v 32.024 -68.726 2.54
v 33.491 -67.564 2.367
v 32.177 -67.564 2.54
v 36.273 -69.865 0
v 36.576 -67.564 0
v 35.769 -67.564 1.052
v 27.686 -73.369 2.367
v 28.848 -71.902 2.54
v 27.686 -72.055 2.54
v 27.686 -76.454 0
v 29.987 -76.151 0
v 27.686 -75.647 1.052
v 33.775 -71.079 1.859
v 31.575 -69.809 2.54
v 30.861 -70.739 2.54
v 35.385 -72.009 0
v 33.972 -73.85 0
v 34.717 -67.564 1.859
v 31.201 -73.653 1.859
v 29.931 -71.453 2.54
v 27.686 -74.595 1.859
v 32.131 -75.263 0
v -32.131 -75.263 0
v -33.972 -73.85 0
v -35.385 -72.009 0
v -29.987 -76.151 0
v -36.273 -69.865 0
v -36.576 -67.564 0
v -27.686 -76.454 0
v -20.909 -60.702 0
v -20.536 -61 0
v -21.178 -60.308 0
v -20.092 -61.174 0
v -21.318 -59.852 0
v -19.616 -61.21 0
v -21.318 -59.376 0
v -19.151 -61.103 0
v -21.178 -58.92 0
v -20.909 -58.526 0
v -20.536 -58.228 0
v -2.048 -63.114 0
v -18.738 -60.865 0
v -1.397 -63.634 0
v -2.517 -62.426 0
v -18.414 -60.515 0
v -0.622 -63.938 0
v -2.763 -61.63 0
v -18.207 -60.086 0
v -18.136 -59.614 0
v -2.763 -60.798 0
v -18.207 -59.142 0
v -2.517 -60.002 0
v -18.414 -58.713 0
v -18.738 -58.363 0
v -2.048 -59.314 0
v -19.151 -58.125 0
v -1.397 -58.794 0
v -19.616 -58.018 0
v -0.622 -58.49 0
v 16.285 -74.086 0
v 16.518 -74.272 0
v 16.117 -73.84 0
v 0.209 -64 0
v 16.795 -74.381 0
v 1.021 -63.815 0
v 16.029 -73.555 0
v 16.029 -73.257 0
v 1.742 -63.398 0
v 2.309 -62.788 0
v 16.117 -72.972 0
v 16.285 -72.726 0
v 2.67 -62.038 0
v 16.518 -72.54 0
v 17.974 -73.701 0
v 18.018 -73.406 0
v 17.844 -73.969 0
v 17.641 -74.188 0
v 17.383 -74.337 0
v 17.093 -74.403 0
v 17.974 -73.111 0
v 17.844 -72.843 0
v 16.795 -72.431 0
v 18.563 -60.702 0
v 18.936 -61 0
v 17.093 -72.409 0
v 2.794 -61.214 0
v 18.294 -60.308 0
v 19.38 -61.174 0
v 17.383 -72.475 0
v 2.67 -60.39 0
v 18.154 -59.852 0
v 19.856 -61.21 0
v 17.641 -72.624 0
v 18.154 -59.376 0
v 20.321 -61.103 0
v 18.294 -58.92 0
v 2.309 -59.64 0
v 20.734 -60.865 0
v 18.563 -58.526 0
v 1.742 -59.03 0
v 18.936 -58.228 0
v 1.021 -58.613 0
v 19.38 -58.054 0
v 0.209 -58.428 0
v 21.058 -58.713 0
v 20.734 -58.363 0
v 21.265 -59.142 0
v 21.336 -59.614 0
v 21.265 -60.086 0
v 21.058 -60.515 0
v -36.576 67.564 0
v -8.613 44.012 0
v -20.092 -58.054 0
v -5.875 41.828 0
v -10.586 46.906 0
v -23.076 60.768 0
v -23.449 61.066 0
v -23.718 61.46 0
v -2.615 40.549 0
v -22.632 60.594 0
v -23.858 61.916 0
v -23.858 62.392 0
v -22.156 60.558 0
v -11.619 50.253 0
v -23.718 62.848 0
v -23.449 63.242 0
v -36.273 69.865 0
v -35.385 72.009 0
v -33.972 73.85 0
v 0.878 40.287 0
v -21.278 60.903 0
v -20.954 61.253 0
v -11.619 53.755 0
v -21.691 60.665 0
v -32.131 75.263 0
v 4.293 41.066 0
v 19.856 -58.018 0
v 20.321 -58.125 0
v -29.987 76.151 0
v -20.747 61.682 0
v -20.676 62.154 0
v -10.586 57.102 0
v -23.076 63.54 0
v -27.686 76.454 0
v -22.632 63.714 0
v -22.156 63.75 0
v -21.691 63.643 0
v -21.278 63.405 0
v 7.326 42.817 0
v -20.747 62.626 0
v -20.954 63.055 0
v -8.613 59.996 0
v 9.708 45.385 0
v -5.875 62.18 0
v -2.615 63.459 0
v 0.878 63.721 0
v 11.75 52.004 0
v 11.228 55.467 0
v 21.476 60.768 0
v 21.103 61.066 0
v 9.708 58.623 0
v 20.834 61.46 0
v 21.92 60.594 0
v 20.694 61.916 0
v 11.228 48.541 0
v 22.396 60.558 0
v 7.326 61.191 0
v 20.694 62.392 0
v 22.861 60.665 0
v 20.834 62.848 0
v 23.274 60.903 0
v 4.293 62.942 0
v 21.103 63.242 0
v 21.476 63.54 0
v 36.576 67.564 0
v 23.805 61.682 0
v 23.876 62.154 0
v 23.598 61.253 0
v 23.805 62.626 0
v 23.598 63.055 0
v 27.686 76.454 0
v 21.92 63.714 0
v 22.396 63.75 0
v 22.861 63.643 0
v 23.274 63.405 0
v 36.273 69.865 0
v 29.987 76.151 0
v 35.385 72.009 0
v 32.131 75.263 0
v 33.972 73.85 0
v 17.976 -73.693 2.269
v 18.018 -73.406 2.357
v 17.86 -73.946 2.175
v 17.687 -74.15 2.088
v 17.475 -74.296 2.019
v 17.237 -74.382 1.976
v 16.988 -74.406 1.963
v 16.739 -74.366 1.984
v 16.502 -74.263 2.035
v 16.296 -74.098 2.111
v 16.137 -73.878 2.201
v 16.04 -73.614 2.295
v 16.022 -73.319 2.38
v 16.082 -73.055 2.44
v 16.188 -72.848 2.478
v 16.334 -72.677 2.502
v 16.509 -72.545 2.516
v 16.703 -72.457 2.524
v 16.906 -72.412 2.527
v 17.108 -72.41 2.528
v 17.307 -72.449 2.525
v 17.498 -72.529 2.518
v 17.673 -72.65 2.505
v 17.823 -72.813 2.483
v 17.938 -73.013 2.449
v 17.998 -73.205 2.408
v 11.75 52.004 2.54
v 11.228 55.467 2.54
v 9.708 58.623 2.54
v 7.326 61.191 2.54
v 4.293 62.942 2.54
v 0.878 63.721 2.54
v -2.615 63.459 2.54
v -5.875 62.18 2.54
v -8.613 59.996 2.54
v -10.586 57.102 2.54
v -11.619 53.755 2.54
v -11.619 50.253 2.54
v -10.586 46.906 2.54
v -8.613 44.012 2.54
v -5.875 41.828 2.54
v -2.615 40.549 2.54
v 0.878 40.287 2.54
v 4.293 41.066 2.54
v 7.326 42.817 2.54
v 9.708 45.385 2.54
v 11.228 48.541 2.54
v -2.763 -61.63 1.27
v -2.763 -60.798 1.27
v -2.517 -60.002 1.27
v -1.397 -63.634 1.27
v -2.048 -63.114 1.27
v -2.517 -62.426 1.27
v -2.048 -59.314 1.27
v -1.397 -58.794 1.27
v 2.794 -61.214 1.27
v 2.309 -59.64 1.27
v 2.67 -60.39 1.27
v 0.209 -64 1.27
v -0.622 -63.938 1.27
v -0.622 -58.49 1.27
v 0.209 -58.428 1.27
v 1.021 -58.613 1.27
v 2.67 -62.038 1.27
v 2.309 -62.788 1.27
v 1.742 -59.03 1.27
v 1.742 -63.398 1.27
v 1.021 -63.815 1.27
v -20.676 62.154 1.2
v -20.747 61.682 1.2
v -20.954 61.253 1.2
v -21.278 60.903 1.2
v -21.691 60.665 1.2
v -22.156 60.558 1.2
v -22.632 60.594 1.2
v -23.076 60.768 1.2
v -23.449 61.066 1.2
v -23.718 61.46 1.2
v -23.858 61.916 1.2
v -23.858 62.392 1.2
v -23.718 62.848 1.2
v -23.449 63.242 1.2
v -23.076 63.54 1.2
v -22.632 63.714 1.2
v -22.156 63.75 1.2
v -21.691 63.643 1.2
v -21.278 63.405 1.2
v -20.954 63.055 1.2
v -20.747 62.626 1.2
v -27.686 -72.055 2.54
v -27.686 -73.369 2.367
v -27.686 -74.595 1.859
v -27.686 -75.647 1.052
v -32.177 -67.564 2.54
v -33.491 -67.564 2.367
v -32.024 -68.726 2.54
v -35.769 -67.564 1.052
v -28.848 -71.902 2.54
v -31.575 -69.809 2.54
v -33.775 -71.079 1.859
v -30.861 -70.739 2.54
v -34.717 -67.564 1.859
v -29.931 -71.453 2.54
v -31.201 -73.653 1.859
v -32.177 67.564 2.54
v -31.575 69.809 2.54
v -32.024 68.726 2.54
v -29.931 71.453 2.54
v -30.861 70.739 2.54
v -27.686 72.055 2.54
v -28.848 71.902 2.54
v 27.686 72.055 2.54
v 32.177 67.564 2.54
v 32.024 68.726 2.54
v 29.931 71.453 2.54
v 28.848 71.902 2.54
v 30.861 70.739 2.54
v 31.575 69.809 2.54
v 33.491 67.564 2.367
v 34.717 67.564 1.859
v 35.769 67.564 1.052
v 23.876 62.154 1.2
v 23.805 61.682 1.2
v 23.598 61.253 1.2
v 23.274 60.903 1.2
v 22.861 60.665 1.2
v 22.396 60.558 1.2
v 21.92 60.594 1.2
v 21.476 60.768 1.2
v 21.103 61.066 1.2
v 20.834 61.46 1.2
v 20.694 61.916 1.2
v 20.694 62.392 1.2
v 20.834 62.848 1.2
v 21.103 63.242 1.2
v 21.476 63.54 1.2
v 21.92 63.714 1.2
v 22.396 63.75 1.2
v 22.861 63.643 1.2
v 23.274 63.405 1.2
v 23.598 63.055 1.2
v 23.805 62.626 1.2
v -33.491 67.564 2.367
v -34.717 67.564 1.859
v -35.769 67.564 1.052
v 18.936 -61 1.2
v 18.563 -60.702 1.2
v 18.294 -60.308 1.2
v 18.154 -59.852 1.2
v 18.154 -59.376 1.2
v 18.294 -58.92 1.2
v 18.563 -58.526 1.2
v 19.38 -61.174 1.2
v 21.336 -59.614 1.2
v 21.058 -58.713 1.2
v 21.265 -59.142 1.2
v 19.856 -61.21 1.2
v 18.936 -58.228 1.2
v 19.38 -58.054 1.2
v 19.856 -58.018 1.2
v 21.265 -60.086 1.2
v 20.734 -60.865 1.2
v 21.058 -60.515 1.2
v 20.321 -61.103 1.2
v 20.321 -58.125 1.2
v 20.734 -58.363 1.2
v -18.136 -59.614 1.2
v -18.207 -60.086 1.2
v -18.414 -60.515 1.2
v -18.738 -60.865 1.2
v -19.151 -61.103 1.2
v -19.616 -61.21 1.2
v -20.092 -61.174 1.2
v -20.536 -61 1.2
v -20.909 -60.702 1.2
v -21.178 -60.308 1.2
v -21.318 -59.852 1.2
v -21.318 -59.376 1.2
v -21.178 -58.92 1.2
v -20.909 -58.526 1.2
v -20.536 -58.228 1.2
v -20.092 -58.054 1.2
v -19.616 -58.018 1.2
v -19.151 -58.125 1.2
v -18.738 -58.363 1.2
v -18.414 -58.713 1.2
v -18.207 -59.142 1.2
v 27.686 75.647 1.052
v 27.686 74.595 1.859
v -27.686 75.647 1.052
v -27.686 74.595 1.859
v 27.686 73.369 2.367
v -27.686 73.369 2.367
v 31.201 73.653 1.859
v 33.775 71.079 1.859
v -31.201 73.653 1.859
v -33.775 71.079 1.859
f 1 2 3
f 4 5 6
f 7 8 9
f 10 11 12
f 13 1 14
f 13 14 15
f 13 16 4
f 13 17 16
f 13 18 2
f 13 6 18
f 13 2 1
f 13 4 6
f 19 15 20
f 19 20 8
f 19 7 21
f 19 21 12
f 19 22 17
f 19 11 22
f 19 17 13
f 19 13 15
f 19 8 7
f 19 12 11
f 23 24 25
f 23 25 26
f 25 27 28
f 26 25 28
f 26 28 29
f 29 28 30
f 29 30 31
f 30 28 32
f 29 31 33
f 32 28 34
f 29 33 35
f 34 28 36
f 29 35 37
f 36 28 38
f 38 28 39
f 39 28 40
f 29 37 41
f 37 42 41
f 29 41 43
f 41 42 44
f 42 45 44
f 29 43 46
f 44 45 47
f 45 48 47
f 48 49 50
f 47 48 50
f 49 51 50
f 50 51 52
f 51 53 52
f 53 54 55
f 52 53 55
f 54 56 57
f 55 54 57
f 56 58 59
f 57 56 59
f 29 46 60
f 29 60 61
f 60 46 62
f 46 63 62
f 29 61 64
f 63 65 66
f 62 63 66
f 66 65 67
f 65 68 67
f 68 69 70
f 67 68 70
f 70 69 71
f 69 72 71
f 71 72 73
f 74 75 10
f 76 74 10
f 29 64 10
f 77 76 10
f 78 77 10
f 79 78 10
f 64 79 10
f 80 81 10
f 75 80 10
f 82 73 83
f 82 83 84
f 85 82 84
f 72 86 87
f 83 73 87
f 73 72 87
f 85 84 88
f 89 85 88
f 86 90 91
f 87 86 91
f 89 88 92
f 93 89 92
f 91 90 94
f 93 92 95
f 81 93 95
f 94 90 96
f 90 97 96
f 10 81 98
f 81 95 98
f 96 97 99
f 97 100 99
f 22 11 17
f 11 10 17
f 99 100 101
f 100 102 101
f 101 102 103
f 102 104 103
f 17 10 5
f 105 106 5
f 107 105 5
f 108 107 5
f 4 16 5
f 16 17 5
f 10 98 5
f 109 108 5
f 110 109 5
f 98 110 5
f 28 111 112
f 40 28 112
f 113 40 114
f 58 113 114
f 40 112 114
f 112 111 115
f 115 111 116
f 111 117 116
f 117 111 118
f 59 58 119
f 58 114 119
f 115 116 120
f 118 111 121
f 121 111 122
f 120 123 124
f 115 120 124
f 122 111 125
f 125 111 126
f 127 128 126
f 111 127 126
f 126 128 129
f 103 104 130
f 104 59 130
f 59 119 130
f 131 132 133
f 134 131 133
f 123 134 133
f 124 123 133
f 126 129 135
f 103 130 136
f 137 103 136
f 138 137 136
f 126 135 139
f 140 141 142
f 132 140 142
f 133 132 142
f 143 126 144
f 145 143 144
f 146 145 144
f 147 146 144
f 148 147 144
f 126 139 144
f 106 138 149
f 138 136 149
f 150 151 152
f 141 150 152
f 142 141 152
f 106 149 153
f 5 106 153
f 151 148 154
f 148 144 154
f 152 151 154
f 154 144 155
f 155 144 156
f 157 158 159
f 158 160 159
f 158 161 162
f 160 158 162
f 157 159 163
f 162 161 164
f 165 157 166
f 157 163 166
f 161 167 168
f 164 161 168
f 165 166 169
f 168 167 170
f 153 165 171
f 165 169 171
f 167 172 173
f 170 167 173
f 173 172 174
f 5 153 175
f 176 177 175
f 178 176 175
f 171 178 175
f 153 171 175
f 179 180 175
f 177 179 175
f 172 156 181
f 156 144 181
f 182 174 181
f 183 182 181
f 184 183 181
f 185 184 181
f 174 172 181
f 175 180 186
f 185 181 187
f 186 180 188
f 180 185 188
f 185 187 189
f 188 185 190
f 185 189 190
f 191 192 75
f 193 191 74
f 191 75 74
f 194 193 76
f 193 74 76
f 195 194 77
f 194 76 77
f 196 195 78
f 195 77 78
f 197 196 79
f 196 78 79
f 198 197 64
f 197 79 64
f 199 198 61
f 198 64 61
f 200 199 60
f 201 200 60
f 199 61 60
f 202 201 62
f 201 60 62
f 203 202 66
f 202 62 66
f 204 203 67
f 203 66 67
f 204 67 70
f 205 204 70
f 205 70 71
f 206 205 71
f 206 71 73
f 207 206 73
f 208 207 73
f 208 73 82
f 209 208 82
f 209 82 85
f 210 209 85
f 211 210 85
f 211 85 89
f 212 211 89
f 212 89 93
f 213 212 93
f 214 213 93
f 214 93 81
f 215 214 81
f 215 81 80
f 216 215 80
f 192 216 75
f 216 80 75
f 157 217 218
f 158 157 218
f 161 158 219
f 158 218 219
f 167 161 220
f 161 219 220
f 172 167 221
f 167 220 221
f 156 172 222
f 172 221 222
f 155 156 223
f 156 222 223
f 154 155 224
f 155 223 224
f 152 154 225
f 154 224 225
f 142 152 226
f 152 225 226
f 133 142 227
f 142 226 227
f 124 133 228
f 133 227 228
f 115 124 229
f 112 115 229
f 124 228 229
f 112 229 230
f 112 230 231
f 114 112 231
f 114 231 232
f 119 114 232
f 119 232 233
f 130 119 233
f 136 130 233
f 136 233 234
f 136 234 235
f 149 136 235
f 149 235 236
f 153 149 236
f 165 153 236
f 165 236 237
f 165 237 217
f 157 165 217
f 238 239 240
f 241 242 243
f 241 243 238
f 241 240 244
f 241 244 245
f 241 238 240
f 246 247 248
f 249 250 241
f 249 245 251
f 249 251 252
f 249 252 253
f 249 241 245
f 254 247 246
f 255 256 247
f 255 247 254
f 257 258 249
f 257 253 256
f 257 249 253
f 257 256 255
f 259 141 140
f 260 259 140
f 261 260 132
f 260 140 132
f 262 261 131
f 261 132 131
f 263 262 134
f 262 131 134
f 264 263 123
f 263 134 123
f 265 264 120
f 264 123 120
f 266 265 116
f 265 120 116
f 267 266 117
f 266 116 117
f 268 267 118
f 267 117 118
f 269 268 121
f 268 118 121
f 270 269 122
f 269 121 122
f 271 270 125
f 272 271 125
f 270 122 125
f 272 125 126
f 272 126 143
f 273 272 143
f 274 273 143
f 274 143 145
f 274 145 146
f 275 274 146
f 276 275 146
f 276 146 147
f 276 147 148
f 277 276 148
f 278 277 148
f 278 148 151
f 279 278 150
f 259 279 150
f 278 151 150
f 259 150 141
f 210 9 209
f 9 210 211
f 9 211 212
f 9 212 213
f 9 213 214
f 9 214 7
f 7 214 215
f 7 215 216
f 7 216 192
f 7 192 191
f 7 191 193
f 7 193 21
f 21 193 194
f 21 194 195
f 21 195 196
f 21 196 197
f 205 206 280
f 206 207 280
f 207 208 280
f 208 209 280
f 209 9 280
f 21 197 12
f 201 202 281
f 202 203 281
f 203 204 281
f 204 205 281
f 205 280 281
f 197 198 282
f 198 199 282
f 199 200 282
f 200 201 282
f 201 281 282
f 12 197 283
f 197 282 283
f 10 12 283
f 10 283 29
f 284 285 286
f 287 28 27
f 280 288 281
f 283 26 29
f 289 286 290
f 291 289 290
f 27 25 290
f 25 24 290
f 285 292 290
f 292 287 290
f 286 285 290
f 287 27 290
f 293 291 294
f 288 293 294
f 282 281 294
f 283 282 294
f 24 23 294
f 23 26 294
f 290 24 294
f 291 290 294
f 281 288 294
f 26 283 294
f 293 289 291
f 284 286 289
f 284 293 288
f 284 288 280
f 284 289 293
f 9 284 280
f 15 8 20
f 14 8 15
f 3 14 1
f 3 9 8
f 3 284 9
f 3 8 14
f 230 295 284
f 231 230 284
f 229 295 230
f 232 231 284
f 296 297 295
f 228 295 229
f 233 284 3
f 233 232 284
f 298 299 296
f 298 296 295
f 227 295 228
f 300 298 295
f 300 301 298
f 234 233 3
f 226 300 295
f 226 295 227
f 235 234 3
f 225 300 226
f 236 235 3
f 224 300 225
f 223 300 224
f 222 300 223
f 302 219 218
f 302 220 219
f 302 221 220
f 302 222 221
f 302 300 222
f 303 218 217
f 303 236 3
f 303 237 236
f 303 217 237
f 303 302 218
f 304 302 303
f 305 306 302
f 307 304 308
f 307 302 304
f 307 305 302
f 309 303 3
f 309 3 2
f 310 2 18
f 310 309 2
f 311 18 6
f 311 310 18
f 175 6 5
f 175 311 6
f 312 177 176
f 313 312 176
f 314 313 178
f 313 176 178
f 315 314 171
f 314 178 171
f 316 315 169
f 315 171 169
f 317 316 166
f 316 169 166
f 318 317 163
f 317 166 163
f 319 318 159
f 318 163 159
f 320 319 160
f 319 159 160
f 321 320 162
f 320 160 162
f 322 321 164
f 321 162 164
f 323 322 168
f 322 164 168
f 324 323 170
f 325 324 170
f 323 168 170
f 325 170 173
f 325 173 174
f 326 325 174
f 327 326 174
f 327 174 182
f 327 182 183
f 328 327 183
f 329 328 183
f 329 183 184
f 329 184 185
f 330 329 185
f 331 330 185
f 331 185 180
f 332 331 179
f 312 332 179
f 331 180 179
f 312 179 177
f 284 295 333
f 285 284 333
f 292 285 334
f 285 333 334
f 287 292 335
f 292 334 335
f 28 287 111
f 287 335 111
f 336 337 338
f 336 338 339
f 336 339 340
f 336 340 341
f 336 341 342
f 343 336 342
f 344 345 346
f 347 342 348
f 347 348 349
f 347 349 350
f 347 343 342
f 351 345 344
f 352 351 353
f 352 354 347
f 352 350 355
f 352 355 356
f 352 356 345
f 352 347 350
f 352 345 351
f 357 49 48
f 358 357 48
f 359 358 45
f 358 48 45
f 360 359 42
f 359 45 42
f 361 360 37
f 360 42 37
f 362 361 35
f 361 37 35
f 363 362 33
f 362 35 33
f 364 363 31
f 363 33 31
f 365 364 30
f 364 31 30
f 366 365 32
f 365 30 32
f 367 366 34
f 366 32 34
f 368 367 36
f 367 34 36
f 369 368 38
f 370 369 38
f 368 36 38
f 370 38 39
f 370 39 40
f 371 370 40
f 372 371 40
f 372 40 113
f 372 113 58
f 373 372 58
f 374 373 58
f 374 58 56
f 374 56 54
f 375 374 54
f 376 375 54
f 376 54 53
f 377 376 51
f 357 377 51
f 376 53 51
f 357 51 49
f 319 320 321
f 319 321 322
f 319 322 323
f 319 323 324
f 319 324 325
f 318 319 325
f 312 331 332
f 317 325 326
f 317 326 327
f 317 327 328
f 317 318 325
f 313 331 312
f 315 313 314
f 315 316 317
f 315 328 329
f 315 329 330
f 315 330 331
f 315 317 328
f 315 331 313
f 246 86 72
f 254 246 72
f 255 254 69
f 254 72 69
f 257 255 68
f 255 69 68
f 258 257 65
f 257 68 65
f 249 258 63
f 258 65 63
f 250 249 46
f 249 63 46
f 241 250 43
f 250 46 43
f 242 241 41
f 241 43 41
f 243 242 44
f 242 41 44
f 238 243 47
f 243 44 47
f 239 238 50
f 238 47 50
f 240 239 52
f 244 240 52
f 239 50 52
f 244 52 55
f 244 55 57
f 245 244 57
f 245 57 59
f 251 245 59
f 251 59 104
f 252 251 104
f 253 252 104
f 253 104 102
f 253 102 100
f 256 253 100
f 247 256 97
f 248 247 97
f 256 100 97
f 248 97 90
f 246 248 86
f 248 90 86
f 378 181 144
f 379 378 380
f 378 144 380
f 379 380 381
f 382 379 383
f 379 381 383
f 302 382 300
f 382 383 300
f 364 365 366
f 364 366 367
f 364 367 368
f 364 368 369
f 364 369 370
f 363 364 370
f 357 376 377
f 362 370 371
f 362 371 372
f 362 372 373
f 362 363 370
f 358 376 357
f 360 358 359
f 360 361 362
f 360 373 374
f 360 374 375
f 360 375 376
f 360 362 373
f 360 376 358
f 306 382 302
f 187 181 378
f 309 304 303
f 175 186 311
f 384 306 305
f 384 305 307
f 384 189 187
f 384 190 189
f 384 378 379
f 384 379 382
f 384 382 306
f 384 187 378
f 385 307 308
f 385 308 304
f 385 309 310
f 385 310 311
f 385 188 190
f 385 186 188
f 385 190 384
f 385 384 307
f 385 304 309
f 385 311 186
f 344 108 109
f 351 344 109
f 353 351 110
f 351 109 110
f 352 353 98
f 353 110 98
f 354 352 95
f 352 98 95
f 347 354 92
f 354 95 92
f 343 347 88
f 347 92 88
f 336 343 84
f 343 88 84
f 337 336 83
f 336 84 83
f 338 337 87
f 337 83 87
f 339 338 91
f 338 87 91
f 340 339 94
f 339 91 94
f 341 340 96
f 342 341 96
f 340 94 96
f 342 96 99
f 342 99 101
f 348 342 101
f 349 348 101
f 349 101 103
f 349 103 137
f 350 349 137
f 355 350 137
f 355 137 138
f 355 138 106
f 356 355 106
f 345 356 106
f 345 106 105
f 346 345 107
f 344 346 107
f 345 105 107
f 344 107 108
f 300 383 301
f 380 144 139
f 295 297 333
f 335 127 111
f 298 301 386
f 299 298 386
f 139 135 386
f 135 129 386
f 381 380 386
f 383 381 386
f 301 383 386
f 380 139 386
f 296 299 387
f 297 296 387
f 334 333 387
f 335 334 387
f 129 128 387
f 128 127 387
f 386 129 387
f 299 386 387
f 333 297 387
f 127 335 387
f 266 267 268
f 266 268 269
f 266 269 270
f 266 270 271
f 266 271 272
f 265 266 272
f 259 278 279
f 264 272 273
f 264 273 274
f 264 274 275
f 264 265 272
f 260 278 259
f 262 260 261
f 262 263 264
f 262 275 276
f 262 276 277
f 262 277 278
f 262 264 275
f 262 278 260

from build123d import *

# Parameters (mm, degrees)
F1_DEPTH     = 2.54
F2_R         = 11.75
F3_DEPTH     = 2.541
F4_R         = 8.89
F5_T1_DEPTH  = 135.128
F5_T3_DEPTH  = 55.372
F5_T6_ANGLE  = 90
F5_T8_ANGLE  = 90
F5_T10_ANGLE = 90
F5_T12_ANGLE = 90
F6_R         = 1
F7_DEPTH     = 2.541
F9_R         = 1.6
F8_R         = 1.6
F10_DEPTH    = 1.2
F11_R        = 2.794
F12_DEPTH    = 1.27


# Not quite as in the source:
# - a fillet or chamfer that OpenCascade refuses, or shapes differently, is made with other operations: its cross-section is extruded or revolved along the edge and cut away or added


with BuildPart() as f1:
    # F0 (on Top) → F1 (new body)
    with BuildSketch(Plane.XY):
        Polygon((36.576, 76.454), (0, 76.454), (-36.576, 76.454), (-36.576, 0), (-36.576, -76.454), (0, -76.454), (36.576, -76.454), (36.576, 0), align=None)
    extrude(amount=F1_DEPTH)

    # F2 (on face) → F3 (cut, through all)
    with BuildSketch(Plane.XY.offset(2.54)):
        with Locations((0, 52.004)):
            Circle(F2_R)
    extrude(amount=-F3_DEPTH, mode=Mode.SUBTRACT)

    # F4
    f4_edges = [f1.edges().sort_by_distance(p)[0] for p in [
        (-36.576, 76.454, 1.27),
        (36.576, 76.454, 1.27),
        (36.576, -76.454, 1.27),
        (-36.576, -76.454, 1.27),
    ]]
    fillet(f4_edges, radius=F4_R)

    # F5: fillet of radius 5.08 on 1 edges, made by hand

    # F5_s2 → F5_t1 (cut)
    with BuildSketch(Plane.XZ.offset(-67.564)):
        with BuildLine():
            ThreePointArc((32.1765909488, 2.54), (34.7165909488, 1.8594090512), (36.576, 0))
            Line((36.576, 0), (36.576, 2.54))
            Line((36.576, 2.54), (32.1765909488, 2.54))
        make_face()
        with BuildLine():
            ThreePointArc((-32.1765909488, 2.54), (-34.7165909488, 1.8594090512), (-36.576, 0))
            Line((-36.576, 0), (-36.576, 2.54))
            Line((-36.576, 2.54), (-32.1765909488, 2.54))
        make_face()
    extrude(amount=F5_T1_DEPTH, mode=Mode.SUBTRACT)

    # F5_s4 → F5_t3 (cut)
    with BuildSketch(Plane.YZ.offset(-27.686)):
        with BuildLine():
            ThreePointArc((-72.0545909488, 2.54), (-74.5945909488, 1.8594090512), (-76.454, 0))
            Line((-76.454, 0), (-76.454, 2.54))
            Line((-76.454, 2.54), (-72.0545909488, 2.54))
        make_face()
        with BuildLine():
            ThreePointArc((76.454, 0), (74.5945909488, 1.8594090512), (72.0545909488, 2.54))
            Line((72.0545909488, 2.54), (76.454, 2.54))
            Line((76.454, 2.54), (76.454, 0))
        make_face()
    extrude(amount=F5_T3_DEPTH, mode=Mode.SUBTRACT)

    # F5_s5 → F5_t6 (revolve, cut)
    with BuildSketch(Plane.YZ.offset(27.686)):
        with BuildLine():
            ThreePointArc((72.0545909488, 2.54), (74.5945909488, 1.8594090512), (76.454, 0))
            Line((76.454, 0), (76.454, 2.54))
            Line((76.454, 2.54), (72.0545909488, 2.54))
        make_face()
    revolve(axis=Axis((27.686, 67.564, 2.54), (0, 0, -1)), revolution_arc=F5_T6_ANGLE, mode=Mode.SUBTRACT)

    # F5_s7 → F5_t8 (revolve, cut)
    with BuildSketch(Plane.XZ.offset(67.564)):
        with BuildLine():
            ThreePointArc((32.1765909488, 2.54), (34.7165909488, 1.8594090512), (36.576, 0))
            Line((36.576, 0), (36.576, 2.54))
            Line((36.576, 2.54), (32.1765909488, 2.54))
        make_face()
    revolve(axis=Axis((27.686, -67.564, 2.54), (0, 0, -1)), revolution_arc=F5_T8_ANGLE, mode=Mode.SUBTRACT)

    # F5_s9 → F5_t10 (revolve, cut)
    with BuildSketch(Plane.XZ.offset(67.564)):
        with BuildLine():
            ThreePointArc((-32.1765909488, 2.54), (-34.7165909488, 1.8594090512), (-36.576, 0))
            Line((-36.576, 0), (-36.576, 2.54))
            Line((-36.576, 2.54), (-32.1765909488, 2.54))
        make_face()
    revolve(axis=Axis((-27.686, -67.564, 2.54), (0, 0, 1)), revolution_arc=F5_T10_ANGLE, mode=Mode.SUBTRACT)

    # F5_s11 → F5_t12 (revolve, cut)
    with BuildSketch(Plane.YZ.offset(-27.686)):
        with BuildLine():
            ThreePointArc((72.0545909488, 2.54), (74.5945909488, 1.8594090512), (76.454, 0))
            Line((76.454, 0), (76.454, 2.54))
            Line((76.454, 2.54), (72.0545909488, 2.54))
        make_face()
    revolve(axis=Axis((-27.686, 67.564, 2.54), (0, 0, 1)), revolution_arc=F5_T12_ANGLE, mode=Mode.SUBTRACT)

    # F6 (on face) → F7 (cut, through all)
    with BuildSketch(Plane(origin=(0, 0, 0), x_dir=(1, 0, 0), z_dir=(0, 0, -1))):
        with Locations((17.018, 73.406)):
            Circle(F6_R)
    extrude(amount=-F7_DEPTH, mode=Mode.SUBTRACT)

    # F9 (on face) + F8 (on face) → F10 (cut)
    with BuildSketch(Plane(origin=(0, 0, 0), x_dir=(1, 0, 0), z_dir=(0, 0, -1))):
        with Locations((19.736, 59.614)):
            Circle(F9_R)
        with Locations((-19.736, 59.614)):
            Circle(F9_R)
    with BuildSketch(Plane(origin=(0, 0, 0), x_dir=(1, 0, 0), z_dir=(0, 0, -1))):
        with Locations((-22.276, -62.154)):
            Circle(F8_R)
        with Locations((22.276, -62.154)):
            Circle(F8_R)
    extrude(amount=-F10_DEPTH, mode=Mode.SUBTRACT)

    # F11 (on face) → F12 (cut)
    with BuildSketch(Plane(origin=(0, 0, 0), x_dir=(1, 0, 0), z_dir=(0, 0, -1))):
        with Locations((0, 61.214)):
            Circle(F11_R)
    extrude(amount=-F12_DEPTH, mode=Mode.SUBTRACT)


solid = f1.part
